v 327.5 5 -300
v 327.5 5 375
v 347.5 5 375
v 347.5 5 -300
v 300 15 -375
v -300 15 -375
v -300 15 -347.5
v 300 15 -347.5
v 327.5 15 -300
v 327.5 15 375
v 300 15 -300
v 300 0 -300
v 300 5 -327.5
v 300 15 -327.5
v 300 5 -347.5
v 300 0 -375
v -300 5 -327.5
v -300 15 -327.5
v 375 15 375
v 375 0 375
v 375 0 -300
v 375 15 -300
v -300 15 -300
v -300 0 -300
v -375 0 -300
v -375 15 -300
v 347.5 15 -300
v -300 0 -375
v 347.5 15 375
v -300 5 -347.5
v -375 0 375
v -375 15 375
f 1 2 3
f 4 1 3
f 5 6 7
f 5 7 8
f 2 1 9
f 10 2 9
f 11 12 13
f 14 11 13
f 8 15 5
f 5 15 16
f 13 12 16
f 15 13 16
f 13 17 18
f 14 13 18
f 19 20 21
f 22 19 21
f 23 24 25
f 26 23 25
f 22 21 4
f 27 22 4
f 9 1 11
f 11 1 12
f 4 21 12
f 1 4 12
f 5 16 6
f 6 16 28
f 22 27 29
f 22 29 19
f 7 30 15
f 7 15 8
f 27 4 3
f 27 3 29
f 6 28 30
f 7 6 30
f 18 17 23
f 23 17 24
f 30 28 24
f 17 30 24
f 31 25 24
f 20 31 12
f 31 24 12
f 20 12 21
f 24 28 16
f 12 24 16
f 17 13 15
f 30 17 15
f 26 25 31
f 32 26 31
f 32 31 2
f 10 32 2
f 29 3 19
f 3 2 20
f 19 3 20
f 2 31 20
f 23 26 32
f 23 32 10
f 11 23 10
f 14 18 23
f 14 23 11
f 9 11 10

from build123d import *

# Parameters (mm, degrees)
BOSS_EXTRUDE1_DEPTH = 15
SKETCH3_W           = 20
SKETCH3_H           = 10
CUT_EXTRUDE1_DEPTH  = 675
SKETCH4_W           = 20
SKETCH4_H           = 10
CUT_EXTRUDE2_DEPTH  = 751


with BuildPart() as part:
    # Sketch2 → Boss-Extrude1 (new body)
    with BuildSketch(Plane(origin=(0, 0, 0), x_dir=(1, 0, 0), z_dir=(0, 1, 0))):
        Polygon((-375, 300), (-375, -375), (375, -375), (375, 300), (300, 300), (300, 375), (-300, 375), (-300, 300), align=None)
    extrude(amount=BOSS_EXTRUDE1_DEPTH)

    # Sketch3 → Cut-Extrude1 (cut)
    with BuildSketch(Plane.XY.offset(375)):
        with Locations((337.5, 10)):
            Rectangle(SKETCH3_W, SKETCH3_H)
    extrude(amount=-CUT_EXTRUDE1_DEPTH, mode=Mode.SUBTRACT)

    # Sketch4 → Cut-Extrude2 (cut, through all)
    with BuildSketch(Plane(origin=(375, 0, 0), x_dir=(0, 0, -1), z_dir=(1, 0, 0))):
        with Locations((337.5, 10)):
            Rectangle(SKETCH4_W, SKETCH4_H)
    extrude(amount=-CUT_EXTRUDE2_DEPTH, mode=Mode.SUBTRACT)


solid = part.part
